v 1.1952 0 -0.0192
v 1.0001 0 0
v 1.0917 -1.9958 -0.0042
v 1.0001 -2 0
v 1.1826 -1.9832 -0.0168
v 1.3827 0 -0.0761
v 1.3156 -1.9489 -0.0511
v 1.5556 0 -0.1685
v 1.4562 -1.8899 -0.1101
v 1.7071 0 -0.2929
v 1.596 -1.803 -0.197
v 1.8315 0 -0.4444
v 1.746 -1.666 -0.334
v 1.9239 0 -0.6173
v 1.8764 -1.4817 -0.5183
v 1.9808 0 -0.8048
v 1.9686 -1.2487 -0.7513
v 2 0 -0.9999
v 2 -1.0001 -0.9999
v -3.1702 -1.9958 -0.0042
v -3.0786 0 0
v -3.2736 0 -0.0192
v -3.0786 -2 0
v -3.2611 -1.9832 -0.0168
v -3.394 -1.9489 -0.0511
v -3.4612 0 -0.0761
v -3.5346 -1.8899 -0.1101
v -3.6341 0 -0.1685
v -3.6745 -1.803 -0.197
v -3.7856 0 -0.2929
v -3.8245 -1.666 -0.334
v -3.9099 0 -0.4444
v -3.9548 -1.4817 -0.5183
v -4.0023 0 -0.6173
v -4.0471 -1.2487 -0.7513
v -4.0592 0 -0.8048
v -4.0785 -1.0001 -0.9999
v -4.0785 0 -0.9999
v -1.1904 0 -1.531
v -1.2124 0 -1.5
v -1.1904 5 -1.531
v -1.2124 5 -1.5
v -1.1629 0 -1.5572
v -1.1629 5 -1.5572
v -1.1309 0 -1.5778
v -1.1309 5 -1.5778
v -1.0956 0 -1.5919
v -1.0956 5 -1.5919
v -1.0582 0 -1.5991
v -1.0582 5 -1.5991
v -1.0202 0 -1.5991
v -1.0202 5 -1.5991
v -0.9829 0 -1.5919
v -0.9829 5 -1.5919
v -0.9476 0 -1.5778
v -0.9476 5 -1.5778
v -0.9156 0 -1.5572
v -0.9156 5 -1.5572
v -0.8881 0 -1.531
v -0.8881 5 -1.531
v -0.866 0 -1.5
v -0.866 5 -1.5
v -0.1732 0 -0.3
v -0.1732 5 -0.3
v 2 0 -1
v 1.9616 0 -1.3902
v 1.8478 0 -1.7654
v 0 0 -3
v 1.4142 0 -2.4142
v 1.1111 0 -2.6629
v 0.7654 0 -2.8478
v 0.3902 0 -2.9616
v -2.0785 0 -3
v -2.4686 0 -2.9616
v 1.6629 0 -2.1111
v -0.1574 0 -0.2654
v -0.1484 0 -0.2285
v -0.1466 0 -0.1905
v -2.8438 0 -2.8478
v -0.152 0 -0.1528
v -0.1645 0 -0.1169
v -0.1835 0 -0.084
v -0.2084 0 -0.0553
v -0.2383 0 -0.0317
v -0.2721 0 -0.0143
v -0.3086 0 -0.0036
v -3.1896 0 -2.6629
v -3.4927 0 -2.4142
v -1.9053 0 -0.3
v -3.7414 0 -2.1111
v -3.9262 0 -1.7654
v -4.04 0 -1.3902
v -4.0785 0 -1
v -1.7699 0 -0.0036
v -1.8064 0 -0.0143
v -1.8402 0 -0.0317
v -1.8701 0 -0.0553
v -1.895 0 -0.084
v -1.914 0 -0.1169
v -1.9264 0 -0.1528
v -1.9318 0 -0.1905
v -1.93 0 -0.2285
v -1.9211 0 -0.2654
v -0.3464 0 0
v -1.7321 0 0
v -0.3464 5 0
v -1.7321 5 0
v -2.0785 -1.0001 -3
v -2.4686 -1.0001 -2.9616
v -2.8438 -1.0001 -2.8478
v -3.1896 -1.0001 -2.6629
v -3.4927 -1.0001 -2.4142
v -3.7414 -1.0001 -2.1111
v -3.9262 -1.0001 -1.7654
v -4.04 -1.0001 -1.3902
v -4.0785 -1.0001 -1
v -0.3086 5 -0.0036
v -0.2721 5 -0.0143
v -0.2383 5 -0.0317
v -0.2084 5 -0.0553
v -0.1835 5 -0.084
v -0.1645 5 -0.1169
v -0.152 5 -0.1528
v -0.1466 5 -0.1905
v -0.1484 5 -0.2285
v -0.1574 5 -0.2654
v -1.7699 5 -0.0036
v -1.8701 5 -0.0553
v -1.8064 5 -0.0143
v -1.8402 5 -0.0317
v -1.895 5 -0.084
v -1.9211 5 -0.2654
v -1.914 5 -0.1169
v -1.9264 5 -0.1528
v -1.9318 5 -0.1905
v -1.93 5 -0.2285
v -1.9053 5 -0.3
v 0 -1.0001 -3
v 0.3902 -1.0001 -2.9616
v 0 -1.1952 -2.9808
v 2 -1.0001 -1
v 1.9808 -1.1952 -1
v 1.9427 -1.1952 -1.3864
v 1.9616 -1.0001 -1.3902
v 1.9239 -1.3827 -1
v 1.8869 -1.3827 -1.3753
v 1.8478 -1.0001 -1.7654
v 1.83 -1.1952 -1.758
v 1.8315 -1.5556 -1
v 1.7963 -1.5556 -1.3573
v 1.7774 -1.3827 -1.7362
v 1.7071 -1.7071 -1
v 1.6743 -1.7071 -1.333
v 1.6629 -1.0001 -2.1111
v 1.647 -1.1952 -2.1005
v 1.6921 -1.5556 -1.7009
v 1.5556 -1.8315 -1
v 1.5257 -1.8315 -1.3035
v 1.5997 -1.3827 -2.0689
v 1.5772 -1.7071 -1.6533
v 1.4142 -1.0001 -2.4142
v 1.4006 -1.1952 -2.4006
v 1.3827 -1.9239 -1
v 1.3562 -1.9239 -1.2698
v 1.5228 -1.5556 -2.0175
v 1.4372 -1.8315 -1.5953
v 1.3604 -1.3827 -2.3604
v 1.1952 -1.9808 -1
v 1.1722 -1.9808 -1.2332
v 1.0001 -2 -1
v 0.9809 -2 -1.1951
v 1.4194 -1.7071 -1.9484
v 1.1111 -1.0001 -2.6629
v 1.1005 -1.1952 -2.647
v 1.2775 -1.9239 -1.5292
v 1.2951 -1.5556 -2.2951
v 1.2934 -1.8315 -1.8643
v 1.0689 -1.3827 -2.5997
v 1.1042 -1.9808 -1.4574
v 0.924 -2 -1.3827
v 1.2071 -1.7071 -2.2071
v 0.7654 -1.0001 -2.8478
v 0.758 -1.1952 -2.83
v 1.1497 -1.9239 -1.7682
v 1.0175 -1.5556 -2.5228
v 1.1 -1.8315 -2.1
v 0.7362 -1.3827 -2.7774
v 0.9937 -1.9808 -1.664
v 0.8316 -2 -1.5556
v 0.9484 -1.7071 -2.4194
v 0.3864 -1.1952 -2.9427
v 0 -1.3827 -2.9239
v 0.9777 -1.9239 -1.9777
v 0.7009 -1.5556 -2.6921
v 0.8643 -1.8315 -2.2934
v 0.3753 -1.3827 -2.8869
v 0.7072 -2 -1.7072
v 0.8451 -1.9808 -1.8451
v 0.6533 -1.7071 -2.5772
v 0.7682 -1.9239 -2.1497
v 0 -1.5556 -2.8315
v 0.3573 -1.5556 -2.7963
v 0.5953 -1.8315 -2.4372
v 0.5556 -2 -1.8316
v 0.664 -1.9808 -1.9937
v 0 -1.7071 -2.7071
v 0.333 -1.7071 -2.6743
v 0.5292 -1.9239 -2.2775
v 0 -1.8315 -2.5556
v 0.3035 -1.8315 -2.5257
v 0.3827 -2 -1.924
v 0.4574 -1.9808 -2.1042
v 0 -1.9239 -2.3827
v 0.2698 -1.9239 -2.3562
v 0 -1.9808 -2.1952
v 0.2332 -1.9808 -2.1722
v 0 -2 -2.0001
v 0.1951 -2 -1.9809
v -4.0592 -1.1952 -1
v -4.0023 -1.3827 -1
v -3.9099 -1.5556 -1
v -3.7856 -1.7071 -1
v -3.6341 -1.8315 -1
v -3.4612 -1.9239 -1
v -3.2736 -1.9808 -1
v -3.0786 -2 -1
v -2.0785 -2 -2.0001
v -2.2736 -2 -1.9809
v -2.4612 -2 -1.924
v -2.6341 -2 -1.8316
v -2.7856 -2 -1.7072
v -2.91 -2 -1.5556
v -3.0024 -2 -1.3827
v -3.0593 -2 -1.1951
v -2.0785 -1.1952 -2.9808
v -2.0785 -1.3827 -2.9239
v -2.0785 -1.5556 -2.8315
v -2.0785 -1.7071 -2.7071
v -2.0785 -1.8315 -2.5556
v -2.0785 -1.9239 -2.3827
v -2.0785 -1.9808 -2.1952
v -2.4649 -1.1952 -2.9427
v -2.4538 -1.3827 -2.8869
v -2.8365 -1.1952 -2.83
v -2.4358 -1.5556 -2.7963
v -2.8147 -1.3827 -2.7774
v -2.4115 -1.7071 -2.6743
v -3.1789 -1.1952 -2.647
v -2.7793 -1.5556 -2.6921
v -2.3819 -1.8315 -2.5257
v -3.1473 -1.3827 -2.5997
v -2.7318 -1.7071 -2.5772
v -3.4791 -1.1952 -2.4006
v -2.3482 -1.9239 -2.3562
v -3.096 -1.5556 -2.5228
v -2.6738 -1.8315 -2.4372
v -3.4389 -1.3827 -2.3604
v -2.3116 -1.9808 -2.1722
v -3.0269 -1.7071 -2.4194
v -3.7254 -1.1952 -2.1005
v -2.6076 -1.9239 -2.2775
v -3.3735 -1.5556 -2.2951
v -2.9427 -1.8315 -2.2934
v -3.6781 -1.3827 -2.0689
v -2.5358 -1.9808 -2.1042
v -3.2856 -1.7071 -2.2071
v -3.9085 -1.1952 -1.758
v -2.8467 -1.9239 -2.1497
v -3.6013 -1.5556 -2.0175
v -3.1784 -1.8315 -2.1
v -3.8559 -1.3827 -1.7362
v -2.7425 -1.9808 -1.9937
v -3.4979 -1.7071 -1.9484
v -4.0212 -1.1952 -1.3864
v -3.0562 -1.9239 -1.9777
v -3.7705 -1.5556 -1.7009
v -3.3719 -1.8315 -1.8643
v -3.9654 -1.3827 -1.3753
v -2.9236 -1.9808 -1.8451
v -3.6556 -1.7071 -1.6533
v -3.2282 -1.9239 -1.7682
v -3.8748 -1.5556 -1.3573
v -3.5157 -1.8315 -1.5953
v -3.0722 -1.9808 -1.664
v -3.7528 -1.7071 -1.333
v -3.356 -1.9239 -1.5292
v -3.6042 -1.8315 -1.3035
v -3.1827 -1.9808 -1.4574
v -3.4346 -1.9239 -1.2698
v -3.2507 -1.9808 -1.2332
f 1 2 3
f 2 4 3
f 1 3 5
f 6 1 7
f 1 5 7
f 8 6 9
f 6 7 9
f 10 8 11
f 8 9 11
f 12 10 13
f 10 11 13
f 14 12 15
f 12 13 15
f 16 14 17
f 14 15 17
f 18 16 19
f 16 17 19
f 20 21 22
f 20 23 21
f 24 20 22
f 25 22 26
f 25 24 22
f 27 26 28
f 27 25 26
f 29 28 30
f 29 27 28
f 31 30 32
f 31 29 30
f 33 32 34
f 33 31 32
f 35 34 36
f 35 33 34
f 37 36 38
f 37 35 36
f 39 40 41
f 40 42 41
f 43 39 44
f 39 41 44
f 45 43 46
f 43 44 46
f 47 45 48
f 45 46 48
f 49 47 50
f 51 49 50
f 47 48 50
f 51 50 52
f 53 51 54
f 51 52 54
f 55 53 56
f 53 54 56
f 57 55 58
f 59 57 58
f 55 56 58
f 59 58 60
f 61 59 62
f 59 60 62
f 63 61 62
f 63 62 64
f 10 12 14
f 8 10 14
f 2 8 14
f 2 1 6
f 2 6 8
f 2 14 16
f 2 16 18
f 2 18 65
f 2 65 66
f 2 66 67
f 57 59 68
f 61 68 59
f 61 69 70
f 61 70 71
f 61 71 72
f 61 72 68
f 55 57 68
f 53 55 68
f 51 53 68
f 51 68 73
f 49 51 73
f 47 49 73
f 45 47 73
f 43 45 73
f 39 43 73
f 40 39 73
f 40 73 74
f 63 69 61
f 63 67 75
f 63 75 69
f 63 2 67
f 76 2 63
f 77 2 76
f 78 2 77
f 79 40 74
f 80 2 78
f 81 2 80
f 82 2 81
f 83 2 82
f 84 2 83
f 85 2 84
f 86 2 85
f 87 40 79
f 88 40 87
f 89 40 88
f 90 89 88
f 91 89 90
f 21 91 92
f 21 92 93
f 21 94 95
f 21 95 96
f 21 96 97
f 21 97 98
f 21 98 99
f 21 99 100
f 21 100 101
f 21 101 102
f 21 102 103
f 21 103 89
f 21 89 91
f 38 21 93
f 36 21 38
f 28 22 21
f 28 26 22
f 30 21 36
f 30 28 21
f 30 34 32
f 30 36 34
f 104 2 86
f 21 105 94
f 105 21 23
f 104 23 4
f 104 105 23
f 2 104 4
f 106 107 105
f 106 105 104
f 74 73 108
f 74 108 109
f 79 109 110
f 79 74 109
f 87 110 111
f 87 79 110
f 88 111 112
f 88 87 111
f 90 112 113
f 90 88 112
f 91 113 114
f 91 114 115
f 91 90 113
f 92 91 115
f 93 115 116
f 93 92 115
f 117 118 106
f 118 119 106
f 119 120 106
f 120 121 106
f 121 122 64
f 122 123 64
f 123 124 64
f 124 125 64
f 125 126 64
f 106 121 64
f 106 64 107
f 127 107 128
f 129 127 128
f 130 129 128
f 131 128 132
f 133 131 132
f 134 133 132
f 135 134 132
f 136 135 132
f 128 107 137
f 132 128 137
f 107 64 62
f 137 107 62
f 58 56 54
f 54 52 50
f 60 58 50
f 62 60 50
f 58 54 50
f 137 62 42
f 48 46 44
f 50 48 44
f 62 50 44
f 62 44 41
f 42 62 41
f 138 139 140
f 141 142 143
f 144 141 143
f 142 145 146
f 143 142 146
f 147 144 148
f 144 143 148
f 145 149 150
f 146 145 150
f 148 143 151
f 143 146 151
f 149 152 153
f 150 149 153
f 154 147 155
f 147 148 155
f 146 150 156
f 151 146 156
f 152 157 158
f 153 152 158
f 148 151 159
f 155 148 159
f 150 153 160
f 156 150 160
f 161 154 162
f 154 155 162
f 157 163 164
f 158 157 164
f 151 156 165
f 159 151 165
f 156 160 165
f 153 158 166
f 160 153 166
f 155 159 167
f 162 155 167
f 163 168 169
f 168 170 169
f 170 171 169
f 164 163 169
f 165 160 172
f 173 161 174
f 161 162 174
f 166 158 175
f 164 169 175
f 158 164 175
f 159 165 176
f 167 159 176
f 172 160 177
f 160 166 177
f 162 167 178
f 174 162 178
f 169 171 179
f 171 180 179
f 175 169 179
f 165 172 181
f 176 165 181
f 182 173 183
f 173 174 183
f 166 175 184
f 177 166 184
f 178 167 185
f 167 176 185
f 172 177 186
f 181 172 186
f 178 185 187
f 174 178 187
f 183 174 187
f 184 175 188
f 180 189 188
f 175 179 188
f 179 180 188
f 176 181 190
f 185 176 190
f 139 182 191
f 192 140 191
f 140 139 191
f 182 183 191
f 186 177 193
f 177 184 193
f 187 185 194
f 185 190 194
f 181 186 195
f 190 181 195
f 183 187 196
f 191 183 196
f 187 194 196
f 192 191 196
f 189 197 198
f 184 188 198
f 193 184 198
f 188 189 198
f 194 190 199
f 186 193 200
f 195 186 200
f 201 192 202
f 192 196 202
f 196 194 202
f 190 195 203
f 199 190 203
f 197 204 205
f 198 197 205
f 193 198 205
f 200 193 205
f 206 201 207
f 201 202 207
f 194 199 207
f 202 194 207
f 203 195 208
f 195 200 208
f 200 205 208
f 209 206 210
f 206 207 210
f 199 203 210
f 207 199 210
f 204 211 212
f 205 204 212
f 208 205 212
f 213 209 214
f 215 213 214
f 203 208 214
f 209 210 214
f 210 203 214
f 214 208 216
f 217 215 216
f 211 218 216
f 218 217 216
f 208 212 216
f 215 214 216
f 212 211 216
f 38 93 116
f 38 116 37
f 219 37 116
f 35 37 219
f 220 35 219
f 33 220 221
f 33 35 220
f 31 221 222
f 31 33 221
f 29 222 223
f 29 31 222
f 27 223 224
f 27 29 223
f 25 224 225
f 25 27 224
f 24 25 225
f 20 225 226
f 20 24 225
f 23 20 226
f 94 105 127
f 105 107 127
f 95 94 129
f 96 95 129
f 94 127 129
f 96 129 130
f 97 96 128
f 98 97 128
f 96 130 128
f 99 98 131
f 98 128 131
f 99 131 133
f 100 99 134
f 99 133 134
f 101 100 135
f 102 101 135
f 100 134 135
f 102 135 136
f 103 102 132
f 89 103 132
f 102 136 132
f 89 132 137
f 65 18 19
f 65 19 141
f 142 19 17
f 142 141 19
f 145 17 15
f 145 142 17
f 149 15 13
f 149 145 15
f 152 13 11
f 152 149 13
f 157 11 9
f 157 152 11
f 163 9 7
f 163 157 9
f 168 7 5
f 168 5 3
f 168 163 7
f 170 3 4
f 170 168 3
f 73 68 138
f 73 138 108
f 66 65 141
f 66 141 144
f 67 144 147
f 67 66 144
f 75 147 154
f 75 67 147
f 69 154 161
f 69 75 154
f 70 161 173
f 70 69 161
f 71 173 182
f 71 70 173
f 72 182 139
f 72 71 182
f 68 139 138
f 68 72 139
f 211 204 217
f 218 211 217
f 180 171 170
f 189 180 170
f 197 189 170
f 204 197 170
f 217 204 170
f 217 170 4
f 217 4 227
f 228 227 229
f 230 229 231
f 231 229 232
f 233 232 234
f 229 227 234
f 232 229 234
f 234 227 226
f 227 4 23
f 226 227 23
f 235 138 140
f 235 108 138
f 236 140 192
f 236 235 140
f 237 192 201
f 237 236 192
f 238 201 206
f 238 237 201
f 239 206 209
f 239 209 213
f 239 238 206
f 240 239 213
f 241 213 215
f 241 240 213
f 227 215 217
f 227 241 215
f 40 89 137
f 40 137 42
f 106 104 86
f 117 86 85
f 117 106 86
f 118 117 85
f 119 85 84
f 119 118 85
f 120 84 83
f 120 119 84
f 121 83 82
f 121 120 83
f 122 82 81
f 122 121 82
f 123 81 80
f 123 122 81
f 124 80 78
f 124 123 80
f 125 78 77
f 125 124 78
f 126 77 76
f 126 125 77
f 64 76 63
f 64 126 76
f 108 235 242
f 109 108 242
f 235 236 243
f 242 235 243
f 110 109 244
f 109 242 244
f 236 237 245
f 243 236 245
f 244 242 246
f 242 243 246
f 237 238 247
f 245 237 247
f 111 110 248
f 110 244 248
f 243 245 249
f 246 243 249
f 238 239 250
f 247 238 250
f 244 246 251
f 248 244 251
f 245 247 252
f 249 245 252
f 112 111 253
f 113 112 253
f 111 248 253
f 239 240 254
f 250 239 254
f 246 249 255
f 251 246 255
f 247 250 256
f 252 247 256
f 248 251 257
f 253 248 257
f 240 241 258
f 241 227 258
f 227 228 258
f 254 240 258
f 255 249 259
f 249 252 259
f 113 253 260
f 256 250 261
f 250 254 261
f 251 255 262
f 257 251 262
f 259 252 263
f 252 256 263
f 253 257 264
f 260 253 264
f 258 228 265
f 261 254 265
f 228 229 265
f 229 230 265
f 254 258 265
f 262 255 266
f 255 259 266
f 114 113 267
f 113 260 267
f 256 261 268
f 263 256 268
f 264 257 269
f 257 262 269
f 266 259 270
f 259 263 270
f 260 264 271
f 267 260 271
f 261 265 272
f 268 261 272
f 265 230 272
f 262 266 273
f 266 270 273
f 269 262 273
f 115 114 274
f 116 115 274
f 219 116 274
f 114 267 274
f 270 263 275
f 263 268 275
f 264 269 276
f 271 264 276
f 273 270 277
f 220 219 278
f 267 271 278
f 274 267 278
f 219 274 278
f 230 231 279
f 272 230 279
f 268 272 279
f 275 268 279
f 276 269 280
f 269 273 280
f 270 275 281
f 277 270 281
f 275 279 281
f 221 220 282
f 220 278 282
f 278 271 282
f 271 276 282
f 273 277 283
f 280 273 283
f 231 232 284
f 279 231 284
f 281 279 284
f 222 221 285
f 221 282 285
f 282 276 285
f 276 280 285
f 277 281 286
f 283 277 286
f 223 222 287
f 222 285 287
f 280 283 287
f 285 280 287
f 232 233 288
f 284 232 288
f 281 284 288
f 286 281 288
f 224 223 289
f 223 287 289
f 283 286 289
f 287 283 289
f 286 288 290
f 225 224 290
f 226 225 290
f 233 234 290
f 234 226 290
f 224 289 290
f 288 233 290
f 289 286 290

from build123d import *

# Parameters (mm, degrees)
BOSS_EXTRUDE1_DEPTH = 5
BOSS_EXTRUDE2_DEPTH = 2
FILLET1_R           = 1
FILLET2_R           = 0.2


with BuildPart() as part:
    # Sketch2 → Boss-Extrude1 (new body)
    with BuildSketch(Plane(origin=(0, 0, 0), x_dir=(1, 0, 0), z_dir=(0, 1, 0))):
        Polygon((0, 0), (-2.078460969, 0), (-1.039230485, 1.8), align=None)
    extrude(amount=BOSS_EXTRUDE1_DEPTH)

    # Sketch3 → Boss-Extrude2 (add)
    with BuildSketch(Plane.XZ):
        with BuildLine():
            Line((-4.078460969, 0), (2, 0))
            Line((2, 0), (2, -1))
            ThreePointArc((2, -1), (1.414213562, -2.414213562), (0, -3))
            Line((0, -3), (-2.078460969, -3))
            ThreePointArc((-2.078460969, -3), (-3.492674531, -2.414213562), (-4.078460969, -1))
            Line((-4.078460969, -1), (-4.078460969, 0))
        make_face()
    extrude(amount=BOSS_EXTRUDE2_DEPTH)

    # Fillet1
    fillet1_edges = [part.edges().sort_by_distance(p)[0] for p in [
        (-4.078460969, -2, -0.5),
        (-3.492674531, -2, -2.414213562),
        (-1.039230485, -2, -3),
        (2, -2, -0.5),
        (1.414213562, -2, -2.414213562),
        (-4.078460969, -1, 0),
        (2, -1, 0),
    ]]
    fillet(fillet1_edges, radius=FILLET1_R - 0.0001)  # a hair under: the kernel refuses the full size

    # Fillet2
    fillet2_edges = [part.edges().sort_by_distance(p)[0] for p in [
        (0, 2.5, 0),
        (-2.078460969, 2.5, 0),
        (-1.039230485, 2.5, -1.8),
    ]]
    fillet(fillet2_edges, radius=FILLET2_R)


solid = part.part
